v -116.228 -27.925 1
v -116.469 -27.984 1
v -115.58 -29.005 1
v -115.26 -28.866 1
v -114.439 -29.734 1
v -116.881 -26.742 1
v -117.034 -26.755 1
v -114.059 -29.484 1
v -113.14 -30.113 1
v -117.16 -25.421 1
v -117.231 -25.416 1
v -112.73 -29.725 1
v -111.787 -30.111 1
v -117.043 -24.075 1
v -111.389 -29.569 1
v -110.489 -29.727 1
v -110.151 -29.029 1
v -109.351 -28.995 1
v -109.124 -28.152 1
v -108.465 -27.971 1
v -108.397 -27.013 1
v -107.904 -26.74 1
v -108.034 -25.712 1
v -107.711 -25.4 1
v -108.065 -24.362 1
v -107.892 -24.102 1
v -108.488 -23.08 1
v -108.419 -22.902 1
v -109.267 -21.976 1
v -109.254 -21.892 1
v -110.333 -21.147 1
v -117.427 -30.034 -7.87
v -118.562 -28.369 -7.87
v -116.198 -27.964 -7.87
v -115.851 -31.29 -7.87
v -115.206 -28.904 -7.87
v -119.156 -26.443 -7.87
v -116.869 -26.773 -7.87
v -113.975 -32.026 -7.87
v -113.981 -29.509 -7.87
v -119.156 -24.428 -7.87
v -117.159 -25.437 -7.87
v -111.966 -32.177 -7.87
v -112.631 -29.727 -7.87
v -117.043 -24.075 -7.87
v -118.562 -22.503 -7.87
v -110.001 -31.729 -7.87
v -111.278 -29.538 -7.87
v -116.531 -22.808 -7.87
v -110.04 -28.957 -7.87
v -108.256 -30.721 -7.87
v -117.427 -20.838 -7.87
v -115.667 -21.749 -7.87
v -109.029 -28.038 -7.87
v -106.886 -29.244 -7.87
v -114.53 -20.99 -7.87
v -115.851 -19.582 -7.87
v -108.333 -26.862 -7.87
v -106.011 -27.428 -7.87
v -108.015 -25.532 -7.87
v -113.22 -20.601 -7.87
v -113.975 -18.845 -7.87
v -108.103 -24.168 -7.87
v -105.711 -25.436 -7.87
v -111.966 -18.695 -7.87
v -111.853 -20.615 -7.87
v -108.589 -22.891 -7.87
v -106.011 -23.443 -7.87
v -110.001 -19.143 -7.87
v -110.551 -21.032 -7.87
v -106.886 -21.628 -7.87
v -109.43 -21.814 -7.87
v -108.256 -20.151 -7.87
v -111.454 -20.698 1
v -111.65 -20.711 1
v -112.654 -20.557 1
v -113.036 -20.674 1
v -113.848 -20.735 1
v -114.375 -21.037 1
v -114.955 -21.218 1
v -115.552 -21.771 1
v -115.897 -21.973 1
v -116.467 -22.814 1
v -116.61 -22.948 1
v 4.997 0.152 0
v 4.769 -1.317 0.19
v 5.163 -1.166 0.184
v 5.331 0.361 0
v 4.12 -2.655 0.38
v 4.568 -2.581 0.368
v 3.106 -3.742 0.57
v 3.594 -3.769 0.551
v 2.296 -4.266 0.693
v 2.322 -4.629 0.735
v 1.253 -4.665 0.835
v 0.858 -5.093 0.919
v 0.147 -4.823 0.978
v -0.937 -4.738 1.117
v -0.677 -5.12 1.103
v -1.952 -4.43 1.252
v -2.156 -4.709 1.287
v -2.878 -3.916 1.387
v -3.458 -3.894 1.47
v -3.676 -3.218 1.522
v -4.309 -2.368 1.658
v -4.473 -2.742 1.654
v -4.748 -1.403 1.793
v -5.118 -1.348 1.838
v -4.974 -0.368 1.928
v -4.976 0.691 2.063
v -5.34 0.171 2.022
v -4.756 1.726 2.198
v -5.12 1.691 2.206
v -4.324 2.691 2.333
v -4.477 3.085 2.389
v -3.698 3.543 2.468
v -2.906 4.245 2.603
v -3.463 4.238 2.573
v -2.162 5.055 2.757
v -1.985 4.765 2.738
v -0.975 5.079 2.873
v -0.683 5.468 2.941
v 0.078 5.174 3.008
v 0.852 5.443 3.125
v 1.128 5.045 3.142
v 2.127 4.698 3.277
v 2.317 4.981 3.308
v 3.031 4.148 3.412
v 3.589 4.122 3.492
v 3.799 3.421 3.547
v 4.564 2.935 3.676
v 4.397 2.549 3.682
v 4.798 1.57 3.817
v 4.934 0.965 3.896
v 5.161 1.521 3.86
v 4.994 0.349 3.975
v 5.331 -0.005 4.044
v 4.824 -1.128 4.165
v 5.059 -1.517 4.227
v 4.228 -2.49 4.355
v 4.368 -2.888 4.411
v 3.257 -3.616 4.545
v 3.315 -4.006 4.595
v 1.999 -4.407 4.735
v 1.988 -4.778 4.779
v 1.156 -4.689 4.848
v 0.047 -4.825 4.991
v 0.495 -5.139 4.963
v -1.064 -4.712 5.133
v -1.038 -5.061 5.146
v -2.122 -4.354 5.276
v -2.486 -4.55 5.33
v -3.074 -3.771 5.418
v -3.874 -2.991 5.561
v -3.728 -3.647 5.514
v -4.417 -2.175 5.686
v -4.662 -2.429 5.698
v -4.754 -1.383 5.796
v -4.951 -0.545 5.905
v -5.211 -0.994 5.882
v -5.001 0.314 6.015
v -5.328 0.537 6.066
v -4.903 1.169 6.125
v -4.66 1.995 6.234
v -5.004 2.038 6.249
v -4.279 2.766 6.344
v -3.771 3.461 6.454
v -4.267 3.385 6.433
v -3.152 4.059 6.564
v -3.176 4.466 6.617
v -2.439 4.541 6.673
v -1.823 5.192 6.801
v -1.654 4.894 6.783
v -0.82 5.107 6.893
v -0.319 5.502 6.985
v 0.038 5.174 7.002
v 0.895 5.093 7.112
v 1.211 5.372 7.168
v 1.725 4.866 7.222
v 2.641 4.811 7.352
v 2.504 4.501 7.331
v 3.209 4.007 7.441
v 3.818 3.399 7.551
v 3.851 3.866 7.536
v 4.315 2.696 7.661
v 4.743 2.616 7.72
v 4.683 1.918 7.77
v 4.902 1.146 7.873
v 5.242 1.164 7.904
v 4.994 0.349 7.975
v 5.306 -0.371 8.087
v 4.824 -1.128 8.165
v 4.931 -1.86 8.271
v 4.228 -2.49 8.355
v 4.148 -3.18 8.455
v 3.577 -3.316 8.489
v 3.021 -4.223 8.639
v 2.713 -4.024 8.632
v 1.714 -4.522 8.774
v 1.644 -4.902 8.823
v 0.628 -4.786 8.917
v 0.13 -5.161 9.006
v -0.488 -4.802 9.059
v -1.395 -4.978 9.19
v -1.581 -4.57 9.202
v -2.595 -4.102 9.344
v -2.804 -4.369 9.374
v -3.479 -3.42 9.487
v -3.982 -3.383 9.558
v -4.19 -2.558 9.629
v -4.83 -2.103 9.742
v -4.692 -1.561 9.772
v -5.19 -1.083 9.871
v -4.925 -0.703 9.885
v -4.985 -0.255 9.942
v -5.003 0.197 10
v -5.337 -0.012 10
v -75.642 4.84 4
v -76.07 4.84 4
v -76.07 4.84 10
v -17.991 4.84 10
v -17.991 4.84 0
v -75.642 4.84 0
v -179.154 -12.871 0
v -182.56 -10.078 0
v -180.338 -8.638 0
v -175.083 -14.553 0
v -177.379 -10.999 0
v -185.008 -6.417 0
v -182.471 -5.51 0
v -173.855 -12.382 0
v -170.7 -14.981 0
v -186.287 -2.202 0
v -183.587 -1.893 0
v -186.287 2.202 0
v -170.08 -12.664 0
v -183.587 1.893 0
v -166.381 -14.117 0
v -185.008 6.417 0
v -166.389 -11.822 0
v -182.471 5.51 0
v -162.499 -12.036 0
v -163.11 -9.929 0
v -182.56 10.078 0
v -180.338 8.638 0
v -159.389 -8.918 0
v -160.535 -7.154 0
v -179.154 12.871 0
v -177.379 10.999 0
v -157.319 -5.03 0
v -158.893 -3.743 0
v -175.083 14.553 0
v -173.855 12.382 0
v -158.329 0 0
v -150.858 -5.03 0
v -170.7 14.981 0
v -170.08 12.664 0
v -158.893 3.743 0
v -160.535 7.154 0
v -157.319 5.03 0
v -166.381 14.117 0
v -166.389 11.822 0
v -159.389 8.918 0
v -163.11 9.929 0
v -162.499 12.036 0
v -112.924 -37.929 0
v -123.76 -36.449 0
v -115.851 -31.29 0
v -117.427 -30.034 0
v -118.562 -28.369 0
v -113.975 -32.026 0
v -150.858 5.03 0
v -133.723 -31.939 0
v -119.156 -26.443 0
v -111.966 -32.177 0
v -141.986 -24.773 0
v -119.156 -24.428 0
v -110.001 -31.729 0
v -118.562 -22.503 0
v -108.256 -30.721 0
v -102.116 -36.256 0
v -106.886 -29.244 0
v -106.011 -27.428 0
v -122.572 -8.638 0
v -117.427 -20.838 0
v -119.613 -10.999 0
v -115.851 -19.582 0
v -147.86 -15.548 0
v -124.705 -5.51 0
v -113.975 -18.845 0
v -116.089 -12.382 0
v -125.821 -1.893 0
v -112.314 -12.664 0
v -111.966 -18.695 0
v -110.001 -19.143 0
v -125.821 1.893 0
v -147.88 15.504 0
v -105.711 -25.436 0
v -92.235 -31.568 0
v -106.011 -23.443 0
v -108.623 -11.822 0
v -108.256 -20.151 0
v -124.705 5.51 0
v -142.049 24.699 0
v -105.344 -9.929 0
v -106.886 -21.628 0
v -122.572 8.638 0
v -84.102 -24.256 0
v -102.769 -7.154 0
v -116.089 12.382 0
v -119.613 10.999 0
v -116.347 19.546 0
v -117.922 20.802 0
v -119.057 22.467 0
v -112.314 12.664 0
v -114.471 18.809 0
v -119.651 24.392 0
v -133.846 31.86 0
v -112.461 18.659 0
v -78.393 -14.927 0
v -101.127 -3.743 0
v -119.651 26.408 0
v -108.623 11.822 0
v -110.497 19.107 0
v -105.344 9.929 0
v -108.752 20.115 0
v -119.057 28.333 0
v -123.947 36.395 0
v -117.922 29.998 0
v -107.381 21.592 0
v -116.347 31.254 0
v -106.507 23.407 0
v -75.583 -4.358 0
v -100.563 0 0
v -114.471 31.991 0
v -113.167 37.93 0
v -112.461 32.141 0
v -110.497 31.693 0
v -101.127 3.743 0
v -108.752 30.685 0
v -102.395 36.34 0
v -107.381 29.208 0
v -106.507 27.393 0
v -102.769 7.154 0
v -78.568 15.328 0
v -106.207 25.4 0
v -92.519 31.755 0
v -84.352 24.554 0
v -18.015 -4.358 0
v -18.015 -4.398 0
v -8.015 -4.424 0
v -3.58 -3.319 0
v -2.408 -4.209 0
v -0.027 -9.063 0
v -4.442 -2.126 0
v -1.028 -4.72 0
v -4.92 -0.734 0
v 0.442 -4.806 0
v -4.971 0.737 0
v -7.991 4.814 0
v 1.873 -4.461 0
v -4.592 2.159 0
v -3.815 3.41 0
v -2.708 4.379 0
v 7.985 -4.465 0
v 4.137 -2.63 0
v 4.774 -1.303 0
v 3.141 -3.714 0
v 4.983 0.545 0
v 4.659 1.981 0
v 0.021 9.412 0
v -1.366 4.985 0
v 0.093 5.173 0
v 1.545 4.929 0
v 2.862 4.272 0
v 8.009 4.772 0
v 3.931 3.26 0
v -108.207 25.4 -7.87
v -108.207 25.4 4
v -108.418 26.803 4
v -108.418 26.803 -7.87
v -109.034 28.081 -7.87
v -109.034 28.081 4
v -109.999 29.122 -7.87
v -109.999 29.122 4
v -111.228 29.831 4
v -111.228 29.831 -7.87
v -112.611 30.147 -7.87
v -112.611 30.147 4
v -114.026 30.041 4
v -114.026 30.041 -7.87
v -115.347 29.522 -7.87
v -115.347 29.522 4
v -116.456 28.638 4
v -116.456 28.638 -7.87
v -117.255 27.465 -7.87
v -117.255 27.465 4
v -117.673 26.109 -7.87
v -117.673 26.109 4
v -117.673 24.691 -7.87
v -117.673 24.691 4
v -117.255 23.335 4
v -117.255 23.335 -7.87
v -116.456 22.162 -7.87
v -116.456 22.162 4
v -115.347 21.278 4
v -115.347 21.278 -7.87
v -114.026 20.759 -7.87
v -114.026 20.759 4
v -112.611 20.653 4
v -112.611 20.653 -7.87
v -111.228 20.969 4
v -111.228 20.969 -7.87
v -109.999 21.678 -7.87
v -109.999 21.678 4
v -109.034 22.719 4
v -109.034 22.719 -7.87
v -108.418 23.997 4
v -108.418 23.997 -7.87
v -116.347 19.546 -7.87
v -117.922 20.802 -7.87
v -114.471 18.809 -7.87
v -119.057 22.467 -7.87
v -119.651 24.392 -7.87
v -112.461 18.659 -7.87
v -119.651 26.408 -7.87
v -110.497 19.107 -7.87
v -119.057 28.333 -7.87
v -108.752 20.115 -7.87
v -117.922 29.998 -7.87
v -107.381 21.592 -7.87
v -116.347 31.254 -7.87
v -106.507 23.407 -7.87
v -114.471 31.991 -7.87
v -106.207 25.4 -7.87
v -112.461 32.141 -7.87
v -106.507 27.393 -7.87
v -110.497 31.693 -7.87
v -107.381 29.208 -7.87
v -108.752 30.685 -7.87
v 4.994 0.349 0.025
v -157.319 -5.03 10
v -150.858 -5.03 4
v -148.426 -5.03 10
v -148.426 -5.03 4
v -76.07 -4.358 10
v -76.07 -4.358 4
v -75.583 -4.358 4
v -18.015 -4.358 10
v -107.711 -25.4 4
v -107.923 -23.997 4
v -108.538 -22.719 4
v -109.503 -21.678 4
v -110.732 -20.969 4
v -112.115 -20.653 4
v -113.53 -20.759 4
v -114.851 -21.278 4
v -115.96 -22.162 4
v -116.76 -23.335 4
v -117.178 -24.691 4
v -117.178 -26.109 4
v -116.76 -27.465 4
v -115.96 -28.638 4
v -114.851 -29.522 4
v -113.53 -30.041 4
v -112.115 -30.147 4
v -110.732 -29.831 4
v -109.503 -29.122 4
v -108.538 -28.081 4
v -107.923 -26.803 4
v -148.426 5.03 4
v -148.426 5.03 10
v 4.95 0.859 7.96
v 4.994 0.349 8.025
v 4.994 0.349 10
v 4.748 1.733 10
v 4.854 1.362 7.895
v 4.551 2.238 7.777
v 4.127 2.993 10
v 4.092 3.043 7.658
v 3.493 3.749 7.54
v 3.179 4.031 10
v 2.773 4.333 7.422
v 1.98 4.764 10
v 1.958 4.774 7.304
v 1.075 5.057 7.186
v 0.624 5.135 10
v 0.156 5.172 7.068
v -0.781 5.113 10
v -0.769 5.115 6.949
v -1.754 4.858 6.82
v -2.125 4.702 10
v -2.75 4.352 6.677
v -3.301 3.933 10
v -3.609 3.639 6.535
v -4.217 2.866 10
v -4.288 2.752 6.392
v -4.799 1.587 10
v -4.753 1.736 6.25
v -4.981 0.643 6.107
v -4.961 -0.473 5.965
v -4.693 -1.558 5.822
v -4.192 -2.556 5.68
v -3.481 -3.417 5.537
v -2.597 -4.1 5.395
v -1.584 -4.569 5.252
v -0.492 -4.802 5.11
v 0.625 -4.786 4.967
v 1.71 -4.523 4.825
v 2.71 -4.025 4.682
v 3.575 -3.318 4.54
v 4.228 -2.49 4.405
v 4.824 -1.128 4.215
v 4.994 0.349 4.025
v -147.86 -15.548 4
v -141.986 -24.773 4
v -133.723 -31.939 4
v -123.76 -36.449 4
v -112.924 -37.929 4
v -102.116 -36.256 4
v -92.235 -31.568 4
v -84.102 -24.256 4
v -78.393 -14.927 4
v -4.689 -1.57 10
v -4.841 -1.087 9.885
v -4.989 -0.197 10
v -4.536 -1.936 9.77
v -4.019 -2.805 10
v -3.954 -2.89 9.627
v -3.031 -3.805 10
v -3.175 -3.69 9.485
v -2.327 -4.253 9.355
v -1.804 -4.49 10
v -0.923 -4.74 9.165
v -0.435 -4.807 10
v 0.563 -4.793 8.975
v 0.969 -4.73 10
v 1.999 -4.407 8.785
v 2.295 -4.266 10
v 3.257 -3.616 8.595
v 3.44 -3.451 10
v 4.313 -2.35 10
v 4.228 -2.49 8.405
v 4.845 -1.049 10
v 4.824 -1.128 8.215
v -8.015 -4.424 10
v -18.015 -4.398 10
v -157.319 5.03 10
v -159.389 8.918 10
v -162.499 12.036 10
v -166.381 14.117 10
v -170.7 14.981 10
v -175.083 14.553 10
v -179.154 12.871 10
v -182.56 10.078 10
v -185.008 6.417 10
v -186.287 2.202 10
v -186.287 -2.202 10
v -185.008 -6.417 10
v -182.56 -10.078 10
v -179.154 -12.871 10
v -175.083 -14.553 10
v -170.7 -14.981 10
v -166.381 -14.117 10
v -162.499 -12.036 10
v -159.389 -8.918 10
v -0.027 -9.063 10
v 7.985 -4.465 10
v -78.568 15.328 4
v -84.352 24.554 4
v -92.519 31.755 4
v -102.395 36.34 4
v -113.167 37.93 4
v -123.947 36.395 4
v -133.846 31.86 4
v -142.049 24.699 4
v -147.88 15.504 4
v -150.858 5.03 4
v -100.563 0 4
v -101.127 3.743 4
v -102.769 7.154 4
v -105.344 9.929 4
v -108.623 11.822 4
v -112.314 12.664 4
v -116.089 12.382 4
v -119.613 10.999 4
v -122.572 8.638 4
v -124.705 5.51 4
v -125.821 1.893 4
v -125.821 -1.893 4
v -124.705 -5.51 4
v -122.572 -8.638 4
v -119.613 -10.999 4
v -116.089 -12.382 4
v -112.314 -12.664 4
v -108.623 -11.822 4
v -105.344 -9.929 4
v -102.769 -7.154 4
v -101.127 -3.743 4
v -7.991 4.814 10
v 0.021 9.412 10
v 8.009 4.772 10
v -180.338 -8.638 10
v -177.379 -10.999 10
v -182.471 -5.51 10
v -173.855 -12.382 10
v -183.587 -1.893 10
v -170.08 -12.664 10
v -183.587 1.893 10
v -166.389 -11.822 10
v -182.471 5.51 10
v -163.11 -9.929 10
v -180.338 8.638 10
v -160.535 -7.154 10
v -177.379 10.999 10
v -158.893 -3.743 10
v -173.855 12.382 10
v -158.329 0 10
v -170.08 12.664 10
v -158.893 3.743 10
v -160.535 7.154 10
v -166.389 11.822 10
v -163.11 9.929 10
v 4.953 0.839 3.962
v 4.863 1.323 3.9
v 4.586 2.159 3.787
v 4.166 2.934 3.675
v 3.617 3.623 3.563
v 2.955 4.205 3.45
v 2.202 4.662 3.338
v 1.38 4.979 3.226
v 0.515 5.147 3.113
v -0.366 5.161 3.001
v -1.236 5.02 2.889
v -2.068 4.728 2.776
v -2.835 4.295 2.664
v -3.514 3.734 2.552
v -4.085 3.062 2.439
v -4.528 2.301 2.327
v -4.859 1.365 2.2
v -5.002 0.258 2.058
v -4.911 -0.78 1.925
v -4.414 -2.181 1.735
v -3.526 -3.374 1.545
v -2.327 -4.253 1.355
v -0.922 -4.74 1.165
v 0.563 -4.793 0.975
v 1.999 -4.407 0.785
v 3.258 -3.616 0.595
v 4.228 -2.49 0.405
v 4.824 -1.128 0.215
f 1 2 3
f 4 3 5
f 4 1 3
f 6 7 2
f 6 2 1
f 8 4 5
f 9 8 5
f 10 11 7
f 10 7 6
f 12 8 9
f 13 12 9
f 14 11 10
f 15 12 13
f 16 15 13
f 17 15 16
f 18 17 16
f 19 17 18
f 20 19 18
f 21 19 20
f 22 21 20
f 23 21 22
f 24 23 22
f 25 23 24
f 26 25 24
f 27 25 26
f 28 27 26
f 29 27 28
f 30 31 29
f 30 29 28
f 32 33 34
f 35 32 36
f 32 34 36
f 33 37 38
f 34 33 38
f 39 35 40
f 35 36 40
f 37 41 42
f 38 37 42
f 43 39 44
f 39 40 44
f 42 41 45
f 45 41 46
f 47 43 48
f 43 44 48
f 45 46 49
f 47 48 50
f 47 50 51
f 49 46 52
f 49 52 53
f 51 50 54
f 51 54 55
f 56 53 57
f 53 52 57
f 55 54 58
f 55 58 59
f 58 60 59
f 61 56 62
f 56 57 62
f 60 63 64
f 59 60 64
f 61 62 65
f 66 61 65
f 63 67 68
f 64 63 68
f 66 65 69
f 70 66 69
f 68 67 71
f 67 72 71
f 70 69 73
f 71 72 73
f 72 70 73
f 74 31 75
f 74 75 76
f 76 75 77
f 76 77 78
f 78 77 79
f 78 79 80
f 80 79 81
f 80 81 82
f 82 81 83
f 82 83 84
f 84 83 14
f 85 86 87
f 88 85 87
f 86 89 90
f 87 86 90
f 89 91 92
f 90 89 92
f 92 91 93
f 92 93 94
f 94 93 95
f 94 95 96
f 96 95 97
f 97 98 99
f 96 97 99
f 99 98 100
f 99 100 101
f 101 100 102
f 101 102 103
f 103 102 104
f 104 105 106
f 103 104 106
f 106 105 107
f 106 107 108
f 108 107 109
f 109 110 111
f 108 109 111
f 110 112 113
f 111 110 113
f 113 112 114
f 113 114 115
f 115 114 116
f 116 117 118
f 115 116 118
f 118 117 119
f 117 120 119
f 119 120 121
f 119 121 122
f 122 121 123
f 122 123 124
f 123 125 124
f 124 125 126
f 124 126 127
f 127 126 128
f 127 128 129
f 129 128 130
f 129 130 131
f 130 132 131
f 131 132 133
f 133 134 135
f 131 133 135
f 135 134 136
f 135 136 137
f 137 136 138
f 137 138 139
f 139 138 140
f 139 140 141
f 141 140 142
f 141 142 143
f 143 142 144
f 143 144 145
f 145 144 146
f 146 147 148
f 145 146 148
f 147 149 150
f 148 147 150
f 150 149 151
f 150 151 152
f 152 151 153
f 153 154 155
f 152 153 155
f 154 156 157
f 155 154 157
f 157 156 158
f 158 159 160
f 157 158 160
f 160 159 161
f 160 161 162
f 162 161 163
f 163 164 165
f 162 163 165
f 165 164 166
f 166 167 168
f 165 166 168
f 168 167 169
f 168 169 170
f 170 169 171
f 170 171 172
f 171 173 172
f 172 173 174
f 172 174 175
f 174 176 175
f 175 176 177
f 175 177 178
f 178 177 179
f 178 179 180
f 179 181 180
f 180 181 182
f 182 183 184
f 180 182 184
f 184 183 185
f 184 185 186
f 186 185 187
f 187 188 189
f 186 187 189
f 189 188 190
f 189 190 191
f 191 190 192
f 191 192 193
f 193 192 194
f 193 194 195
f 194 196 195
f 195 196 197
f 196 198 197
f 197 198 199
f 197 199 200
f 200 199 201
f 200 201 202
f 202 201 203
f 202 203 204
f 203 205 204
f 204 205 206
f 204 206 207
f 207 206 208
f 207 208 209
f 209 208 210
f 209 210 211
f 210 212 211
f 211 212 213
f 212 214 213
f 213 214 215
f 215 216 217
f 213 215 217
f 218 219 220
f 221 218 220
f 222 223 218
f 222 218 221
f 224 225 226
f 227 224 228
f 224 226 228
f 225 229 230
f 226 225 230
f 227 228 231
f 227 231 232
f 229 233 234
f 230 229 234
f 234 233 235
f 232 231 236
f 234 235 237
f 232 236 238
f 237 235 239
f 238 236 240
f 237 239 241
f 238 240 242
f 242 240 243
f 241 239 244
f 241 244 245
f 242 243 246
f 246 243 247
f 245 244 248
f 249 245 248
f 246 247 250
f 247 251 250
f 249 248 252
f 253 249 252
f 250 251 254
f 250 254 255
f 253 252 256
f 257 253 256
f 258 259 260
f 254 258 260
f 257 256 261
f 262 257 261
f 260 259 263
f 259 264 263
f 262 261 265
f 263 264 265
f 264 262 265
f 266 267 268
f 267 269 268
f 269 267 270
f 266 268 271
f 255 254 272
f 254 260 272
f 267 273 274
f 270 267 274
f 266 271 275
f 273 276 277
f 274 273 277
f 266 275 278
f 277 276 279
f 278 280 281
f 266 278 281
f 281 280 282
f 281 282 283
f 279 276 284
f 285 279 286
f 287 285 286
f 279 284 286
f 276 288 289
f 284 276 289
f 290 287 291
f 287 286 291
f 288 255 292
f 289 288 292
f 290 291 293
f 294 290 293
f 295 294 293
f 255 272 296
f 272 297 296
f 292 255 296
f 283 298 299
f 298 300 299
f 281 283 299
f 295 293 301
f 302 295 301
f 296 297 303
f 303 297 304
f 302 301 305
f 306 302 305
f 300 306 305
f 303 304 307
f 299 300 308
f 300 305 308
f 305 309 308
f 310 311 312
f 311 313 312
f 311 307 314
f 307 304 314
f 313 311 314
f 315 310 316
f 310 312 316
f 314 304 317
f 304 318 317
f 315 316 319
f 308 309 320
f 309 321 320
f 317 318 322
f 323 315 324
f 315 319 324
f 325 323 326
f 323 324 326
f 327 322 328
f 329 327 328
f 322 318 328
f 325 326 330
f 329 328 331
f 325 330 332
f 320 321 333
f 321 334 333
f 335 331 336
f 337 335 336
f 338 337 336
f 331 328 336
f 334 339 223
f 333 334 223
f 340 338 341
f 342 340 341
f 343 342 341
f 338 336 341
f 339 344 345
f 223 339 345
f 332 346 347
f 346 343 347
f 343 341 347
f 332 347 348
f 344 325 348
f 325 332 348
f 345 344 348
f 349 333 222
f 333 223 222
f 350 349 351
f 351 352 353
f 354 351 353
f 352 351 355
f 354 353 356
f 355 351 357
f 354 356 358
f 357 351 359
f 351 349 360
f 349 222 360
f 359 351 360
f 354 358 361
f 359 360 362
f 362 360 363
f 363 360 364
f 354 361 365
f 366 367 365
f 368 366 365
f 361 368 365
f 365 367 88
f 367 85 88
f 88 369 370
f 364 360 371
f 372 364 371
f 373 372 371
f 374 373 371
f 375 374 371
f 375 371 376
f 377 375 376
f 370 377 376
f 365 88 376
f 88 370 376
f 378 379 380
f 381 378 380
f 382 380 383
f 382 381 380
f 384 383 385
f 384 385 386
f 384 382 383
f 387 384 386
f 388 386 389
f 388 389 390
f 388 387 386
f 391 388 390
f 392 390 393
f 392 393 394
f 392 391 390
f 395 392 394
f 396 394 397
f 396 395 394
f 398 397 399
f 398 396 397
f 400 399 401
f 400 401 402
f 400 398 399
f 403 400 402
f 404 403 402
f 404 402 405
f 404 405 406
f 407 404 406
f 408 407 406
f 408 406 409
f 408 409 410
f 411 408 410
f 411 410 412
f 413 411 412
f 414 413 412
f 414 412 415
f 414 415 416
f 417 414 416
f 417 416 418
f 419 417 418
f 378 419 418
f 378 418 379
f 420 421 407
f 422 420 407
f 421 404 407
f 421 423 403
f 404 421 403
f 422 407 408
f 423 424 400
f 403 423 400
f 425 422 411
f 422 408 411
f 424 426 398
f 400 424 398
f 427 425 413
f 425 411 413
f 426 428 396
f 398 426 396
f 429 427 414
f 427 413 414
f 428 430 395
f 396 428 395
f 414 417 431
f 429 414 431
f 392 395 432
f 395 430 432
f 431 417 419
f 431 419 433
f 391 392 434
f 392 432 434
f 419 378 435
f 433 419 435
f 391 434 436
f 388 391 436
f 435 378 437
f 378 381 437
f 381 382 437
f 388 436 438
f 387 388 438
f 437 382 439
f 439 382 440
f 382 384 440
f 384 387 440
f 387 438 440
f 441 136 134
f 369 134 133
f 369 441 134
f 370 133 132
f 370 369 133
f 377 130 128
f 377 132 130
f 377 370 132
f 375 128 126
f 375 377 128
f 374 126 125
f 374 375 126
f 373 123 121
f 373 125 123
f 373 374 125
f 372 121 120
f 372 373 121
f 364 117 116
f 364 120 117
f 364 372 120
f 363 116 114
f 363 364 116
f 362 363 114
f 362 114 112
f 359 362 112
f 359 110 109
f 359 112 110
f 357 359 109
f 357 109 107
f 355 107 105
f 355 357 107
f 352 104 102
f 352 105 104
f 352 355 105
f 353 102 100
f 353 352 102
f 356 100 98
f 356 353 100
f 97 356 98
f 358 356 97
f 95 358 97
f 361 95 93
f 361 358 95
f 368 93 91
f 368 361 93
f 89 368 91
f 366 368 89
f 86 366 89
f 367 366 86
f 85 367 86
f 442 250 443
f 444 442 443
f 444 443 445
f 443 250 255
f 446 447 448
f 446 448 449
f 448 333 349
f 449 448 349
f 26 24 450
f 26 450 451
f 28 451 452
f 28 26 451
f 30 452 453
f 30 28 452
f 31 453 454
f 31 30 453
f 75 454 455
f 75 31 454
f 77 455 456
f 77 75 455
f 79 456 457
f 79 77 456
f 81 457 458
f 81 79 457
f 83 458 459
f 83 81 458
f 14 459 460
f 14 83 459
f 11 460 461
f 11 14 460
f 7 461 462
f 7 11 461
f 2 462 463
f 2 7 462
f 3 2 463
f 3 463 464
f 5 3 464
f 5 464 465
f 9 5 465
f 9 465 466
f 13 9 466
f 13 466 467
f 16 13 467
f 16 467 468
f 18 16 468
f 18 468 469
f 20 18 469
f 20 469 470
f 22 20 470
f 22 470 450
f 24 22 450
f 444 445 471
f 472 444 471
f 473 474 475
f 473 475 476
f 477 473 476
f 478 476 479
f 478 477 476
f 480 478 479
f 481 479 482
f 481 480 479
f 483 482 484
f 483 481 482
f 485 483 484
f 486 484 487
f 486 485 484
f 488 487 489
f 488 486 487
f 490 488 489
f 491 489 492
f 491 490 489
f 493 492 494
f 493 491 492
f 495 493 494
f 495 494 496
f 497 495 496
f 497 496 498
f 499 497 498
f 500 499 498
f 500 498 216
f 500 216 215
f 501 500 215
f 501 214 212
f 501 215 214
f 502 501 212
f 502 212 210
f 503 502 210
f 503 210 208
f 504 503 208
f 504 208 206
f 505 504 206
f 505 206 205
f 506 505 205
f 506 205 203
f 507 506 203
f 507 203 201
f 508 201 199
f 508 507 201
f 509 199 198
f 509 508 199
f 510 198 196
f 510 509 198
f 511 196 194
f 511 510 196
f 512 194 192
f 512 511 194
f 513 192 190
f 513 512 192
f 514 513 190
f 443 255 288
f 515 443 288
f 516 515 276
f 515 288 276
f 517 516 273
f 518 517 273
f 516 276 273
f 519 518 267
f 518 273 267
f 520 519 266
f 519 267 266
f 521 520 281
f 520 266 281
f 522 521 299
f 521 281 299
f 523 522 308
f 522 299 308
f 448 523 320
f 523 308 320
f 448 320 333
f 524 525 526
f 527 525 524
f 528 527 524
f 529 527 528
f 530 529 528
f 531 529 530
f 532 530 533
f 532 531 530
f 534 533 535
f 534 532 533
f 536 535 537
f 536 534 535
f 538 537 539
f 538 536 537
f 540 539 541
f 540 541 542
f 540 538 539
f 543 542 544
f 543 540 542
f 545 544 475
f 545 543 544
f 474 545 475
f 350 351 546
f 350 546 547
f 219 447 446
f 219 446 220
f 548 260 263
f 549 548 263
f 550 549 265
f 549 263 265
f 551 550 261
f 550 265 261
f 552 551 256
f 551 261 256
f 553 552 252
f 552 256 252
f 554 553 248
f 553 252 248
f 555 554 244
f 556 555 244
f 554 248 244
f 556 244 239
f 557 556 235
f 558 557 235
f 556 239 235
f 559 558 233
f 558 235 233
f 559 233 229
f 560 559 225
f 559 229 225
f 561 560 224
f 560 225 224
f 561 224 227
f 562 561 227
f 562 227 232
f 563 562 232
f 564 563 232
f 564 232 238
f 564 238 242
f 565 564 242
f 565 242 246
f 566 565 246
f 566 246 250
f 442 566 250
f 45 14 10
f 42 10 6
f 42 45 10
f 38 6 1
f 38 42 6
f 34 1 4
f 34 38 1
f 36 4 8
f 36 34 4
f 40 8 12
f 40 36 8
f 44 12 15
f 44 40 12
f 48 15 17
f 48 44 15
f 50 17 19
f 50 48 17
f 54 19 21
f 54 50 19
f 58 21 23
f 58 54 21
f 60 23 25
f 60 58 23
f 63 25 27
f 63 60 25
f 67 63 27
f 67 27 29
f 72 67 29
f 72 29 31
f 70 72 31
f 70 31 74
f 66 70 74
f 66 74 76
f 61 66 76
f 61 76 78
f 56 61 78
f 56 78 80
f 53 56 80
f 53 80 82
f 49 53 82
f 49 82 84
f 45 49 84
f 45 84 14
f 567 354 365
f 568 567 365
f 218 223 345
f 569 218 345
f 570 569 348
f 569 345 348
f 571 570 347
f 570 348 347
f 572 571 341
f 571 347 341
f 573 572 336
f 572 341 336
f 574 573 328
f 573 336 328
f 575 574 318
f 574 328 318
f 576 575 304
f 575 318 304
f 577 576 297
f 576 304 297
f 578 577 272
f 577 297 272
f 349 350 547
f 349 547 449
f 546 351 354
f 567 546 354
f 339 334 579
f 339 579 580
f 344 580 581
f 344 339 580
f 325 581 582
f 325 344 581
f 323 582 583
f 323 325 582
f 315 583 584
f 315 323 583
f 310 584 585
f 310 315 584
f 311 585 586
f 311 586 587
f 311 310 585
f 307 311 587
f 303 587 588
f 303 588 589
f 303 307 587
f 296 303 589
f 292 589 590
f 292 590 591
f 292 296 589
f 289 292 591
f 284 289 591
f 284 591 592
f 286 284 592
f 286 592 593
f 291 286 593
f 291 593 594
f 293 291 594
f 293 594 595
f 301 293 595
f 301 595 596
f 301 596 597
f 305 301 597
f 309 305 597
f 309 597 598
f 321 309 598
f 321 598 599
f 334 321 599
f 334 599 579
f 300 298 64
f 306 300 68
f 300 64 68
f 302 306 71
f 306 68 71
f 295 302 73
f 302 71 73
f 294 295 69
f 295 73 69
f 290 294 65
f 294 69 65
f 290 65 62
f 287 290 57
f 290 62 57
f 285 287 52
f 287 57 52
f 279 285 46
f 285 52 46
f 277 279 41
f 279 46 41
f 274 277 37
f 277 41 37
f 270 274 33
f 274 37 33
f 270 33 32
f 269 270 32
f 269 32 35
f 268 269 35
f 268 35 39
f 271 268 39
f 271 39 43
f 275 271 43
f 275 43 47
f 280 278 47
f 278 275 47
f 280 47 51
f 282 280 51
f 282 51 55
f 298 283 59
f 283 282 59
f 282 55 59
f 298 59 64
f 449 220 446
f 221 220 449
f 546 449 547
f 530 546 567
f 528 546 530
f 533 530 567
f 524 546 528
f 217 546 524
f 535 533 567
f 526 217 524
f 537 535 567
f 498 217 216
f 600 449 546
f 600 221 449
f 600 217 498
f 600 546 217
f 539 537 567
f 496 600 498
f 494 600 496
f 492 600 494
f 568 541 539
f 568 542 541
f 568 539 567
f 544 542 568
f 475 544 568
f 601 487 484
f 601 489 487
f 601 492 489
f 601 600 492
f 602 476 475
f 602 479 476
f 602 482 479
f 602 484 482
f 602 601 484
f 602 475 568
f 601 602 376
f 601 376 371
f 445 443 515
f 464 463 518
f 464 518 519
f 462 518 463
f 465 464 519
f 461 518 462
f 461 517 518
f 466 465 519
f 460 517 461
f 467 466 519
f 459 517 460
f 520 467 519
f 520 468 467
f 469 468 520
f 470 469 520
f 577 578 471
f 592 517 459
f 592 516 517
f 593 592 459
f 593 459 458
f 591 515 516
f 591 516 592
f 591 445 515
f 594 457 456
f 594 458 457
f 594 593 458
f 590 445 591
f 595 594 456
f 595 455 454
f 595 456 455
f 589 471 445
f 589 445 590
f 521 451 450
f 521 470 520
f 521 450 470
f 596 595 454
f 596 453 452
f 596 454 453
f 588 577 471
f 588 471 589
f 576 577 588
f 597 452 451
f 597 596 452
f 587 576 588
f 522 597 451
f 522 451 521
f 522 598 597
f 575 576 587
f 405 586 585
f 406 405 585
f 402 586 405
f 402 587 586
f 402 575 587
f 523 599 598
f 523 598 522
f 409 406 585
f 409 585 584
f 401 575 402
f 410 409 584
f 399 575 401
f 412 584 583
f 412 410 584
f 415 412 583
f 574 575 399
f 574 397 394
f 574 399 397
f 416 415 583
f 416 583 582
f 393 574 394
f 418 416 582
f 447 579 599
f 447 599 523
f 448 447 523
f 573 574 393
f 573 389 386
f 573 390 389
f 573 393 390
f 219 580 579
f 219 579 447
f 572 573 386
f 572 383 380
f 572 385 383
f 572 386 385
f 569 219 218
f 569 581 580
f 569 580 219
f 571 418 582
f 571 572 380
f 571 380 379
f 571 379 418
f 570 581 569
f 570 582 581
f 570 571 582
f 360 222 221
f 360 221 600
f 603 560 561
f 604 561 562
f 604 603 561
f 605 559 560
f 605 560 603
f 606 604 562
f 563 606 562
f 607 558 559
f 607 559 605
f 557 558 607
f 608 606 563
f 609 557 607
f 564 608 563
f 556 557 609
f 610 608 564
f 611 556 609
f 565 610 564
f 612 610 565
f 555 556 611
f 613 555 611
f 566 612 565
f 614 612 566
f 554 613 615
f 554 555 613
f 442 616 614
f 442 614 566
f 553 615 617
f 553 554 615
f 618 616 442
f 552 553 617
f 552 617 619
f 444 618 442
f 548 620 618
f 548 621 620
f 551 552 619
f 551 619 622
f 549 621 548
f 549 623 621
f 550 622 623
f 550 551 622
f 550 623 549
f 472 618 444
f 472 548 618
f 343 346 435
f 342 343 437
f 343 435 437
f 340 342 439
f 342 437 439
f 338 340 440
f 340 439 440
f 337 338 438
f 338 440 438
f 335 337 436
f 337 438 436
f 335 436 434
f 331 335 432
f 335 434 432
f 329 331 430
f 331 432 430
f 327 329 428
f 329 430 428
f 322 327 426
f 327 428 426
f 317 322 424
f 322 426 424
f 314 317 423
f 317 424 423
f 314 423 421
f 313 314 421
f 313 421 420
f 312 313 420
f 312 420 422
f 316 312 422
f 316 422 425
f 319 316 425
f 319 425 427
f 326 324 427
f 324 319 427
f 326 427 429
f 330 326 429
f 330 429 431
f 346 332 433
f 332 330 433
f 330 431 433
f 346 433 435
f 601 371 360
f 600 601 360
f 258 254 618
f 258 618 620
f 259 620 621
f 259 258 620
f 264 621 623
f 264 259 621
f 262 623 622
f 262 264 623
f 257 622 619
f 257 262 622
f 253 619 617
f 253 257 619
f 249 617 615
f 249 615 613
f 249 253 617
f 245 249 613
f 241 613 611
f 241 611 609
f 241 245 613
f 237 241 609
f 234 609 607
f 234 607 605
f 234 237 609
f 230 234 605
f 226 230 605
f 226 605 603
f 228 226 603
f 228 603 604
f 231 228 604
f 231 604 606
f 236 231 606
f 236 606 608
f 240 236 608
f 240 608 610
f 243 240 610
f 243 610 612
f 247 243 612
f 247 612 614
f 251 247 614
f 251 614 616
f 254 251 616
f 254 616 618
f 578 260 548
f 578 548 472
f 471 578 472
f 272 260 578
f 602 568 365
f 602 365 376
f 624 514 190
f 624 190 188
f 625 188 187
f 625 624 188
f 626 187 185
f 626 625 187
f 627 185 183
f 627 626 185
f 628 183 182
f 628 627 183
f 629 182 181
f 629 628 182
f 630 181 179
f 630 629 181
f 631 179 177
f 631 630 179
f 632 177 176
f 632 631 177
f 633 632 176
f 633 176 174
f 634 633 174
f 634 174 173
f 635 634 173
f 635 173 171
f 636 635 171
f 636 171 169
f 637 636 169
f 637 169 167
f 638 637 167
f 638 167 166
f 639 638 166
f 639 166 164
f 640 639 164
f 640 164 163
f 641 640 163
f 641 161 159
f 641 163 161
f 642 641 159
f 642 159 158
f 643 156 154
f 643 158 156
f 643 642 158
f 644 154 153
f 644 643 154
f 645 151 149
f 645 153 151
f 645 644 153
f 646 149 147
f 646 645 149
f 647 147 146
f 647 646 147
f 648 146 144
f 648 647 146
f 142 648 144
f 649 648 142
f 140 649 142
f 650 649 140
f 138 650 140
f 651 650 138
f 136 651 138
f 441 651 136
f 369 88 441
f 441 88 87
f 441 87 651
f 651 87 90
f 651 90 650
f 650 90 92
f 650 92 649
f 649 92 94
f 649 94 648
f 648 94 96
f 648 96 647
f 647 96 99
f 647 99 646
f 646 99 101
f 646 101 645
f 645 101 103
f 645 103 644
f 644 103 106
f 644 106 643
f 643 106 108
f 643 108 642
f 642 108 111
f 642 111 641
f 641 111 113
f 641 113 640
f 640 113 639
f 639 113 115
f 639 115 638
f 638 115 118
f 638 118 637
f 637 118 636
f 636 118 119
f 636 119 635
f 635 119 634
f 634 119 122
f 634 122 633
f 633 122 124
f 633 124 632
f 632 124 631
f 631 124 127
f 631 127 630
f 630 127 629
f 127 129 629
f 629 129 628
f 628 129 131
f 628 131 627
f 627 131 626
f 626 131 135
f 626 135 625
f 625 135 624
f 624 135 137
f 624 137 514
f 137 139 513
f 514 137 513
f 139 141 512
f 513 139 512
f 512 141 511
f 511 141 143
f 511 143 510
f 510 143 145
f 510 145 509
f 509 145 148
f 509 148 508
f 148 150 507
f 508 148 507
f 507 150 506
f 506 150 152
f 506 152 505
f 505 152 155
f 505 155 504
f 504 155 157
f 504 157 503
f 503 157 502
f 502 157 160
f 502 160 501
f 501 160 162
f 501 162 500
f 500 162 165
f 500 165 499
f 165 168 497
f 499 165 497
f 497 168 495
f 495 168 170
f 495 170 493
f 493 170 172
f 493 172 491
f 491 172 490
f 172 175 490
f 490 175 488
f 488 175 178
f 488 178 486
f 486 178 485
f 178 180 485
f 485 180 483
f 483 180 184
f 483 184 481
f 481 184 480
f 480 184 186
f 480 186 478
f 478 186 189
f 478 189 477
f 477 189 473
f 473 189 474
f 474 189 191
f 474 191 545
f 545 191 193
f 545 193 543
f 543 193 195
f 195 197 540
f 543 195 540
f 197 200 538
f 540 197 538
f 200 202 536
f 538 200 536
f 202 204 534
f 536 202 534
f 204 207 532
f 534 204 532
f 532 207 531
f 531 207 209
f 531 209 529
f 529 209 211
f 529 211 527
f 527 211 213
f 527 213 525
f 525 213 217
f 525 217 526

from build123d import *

# Parameters (mm, degrees)
BOSS_EXTRUDE1_DEPTH       = 10
CUT_EXTRUDE1_DEPTH        = 10
CUT_EXTRUDE1_DEPTH_BACK   = 10
SKETCH2_R                 = 5
CUT_SWEEP1_PITCH          = 4
CUT_SWEEP1_HEIGHT         = 10
CUT_SWEEP1_RADIUS         = 5
EXTRUDE_THIN2_DEPTH       = 10
BODY_MOVE_COPY1_ANGLE     = 2
SKETCH10_W                = 58.079037791
SKETCH10_H                = 9.197874715
BOSS_EXTRUDE2_DEPTH       = 10
SKETCH21_R                = 37.93035277
BOSS_EXTRUDE11_DEPTH      = 4
CUT_EXTRUDE5_DEPTH        = 4
CUT_EXTRUDE5_DEPTH_BACK   = 4
SKETCH22_R                = 12.7
CUT_EXTRUDE6_DEPTH        = 4
CUT_EXTRUDE6_DEPTH_BACK   = 4
SKETCH23_R                = 4.76
CUT_EXTRUDE7_DEPTH        = 4
CUT_EXTRUDE7_DEPTH_BACK   = 4
SKETCH24_R                = 4.76
BOSS_EXTRUDE13_DEPTH      = 1
BOSS_EXTRUDE13_DEPTH_BACK = 7.87
SKETCH27_R                = 6.76
CUT_EXTRUDE12_DEPTH       = 1
CUT_EXTRUDE12_DEPTH_BACK  = 7.87
SKETCH28_R                = 4.76
BOSS_EXTRUDE14_DEPTH      = 1
BOSS_EXTRUDE14_DEPTH_BACK = 7.87
SKETCH29_R                = 6.76
CUT_EXTRUDE13_DEPTH       = 1
CUT_EXTRUDE13_DEPTH_BACK  = 7.87
SKETCH30_R                = 4.585303289
SKETCH20_W                = 8.892243229
SKETCH20_H                = 10.060161684
BOSS_EXTRUDE15_DEPTH      = 10
SKETCH19_R                = 15
BOSS_EXTRUDE16_DEPTH      = 10
CUT_EXTRUDE14_DEPTH       = 10
CUT_EXTRUDE14_DEPTH_BACK  = 10
SKETCH31_R                = 12.7


with BuildPart() as part:
    # Sketch1 → Boss-Extrude1 (new body)
    with BuildSketch(Plane.XY):
        Polygon((-8.167579482, -4.315550803), (-0.346413115, -9.231106721), (7.821166368, -4.915555918), (8.167579482, 4.315550803), (0.346413115, 9.231106721), (-7.821166368, 4.915555918), align=None)
    extrude(amount=BOSS_EXTRUDE1_DEPTH)

    # Sketch2 → Cut-Extrude1 (cut, two sides: drawn at the far end of the back side and taken through both)
    with BuildSketch(Plane.XY.offset(-CUT_EXTRUDE1_DEPTH_BACK)):
        Circle(SKETCH2_R)
    extrude(amount=CUT_EXTRUDE1_DEPTH + CUT_EXTRUDE1_DEPTH_BACK, mode=Mode.SUBTRACT)

    # Cut-Sweep1: sweep along a helix
    with BuildLine() as cut_sweep1_path:
        Helix(CUT_SWEEP1_PITCH, CUT_SWEEP1_HEIGHT, CUT_SWEEP1_RADIUS, center=(0, 0, 0), direction=(0, 0, 1), lefthand=True)
    # Sketch4 → Cut-Sweep1 (sweep, cut)
    with BuildSketch(Plane.XY):
        Polygon((5.337109255, 0), (4.831445373, 0.291945178), (4.831445373, -0.291945178), align=None)
    sweep(path=cut_sweep1_path.line, is_frenet=True, mode=Mode.SUBTRACT)

    # Sketch6 → Extrude-Thin2 (add)
    with BuildSketch(Plane.XY):
        Polygon((-7.821166368, 4.915555918), (-8.167579482, -4.315550803), (-18.160545639, -3.940547606), (-17.814132524, 5.290559115), align=None)
    extrude(amount=EXTRUDE_THIN2_DEPTH)


with BuildPart() as part_1:
    # Body-Move/Copy1: moved
    add(part.part.rotate(Axis((-4.996483078, 0, 0), (0, 0, 1)), BODY_MOVE_COPY1_ANGLE))

    # Sketch10 → Boss-Extrude2 (add)
    with BuildSketch(Plane.XY):
        with Locations((-47.030481105, 0.241069377)):
            Rectangle(SKETCH10_W, SKETCH10_H)
    extrude(amount=BOSS_EXTRUDE2_DEPTH)

    # Sketch21 → Boss-Extrude11 (add)
    with BuildSketch(Plane.XY):
        with Locations((-113.262670717, 0)):
            Circle(SKETCH21_R)
    extrude(amount=BOSS_EXTRUDE11_DEPTH)

    # Sketch22 → Cut-Extrude5 (cut, two sides: drawn at the far end of the back side and taken through both)
    with BuildSketch(Plane.XY.offset(-CUT_EXTRUDE5_DEPTH_BACK)):
        with Locations((-113.262670717, 0)):
            Circle(SKETCH22_R)
    extrude(amount=CUT_EXTRUDE5_DEPTH + CUT_EXTRUDE5_DEPTH_BACK, mode=Mode.SUBTRACT)

    # Sketch23 → Cut-Extrude6 (cut, two sides: drawn at the far end of the back side and taken through both)
    with BuildSketch(Plane.XY.offset(-CUT_EXTRUDE6_DEPTH_BACK)):
        with Locations((-112.966619713, 25.4)):
            Circle(SKETCH23_R)
    extrude(amount=CUT_EXTRUDE6_DEPTH + CUT_EXTRUDE6_DEPTH_BACK, mode=Mode.SUBTRACT)

    # Sketch24 → Cut-Extrude7 (cut, two sides: drawn at the far end of the back side and taken through both)
    with BuildSketch(Plane.XY.offset(-CUT_EXTRUDE7_DEPTH_BACK)):
        with Locations((-112.471115727, -25.4)):
            Circle(SKETCH24_R)
    extrude(amount=CUT_EXTRUDE7_DEPTH + CUT_EXTRUDE7_DEPTH_BACK, mode=Mode.SUBTRACT)

    # Sketch27 → Boss-Extrude13 (add, two sides: drawn at the far end of the back side and taken through both)
    with BuildSketch(Plane.XY.offset(-BOSS_EXTRUDE13_DEPTH_BACK)):
        with Locations((-112.966619713, 25.4)):
            Circle(SKETCH27_R)
    extrude(amount=BOSS_EXTRUDE13_DEPTH + BOSS_EXTRUDE13_DEPTH_BACK)

    # Sketch28 → Cut-Extrude12 (cut, two sides: drawn at the far end of the back side and taken through both)
    with BuildSketch(Plane.XY.offset(-CUT_EXTRUDE12_DEPTH_BACK)):
        with Locations((-112.966619713, 25.4)):
            Circle(SKETCH28_R)
    extrude(amount=CUT_EXTRUDE12_DEPTH + CUT_EXTRUDE12_DEPTH_BACK, mode=Mode.SUBTRACT)

    # Sketch29 → Boss-Extrude14 (add, two sides: drawn at the far end of the back side and taken through both)
    with BuildSketch(Plane(origin=(-24.725624919, 0.221889436, 0), x_dir=(1, 0, 0), z_dir=(0, 0, 1)).offset(-BOSS_EXTRUDE14_DEPTH_BACK)):
        with Locations((-87.745490808, -25.657760722)):
            Circle(SKETCH29_R)
    extrude(amount=BOSS_EXTRUDE14_DEPTH + BOSS_EXTRUDE14_DEPTH_BACK)

    # Sketch30 → Cut-Extrude13 (cut, two sides: drawn at the far end of the back side and taken through both)
    with BuildSketch(Plane.XY.offset(-CUT_EXTRUDE13_DEPTH_BACK)):
        with Locations(Location((-112.583618689, -25.142193243, 0), (0, 0, 166.546290498))):
            Circle(SKETCH30_R)
    extrude(amount=CUT_EXTRUDE13_DEPTH + CUT_EXTRUDE13_DEPTH_BACK, mode=Mode.SUBTRACT)

    # Sketch20 → Boss-Extrude15 (add)
    with BuildSketch(Plane.XY):
        with Locations((-152.872413964, 0)):
            Rectangle(SKETCH20_W, SKETCH20_H)
    extrude(amount=BOSS_EXTRUDE15_DEPTH)

    # Sketch19 → Boss-Extrude16 (add)
    with BuildSketch(Plane.XY):
        with Locations((-171.45, 0)):
            Circle(SKETCH19_R)
    extrude(amount=BOSS_EXTRUDE16_DEPTH)

    # Sketch31 → Cut-Extrude14 (cut, two sides: drawn at the far end of the back side and taken through both)
    with BuildSketch(Plane.XY.offset(-CUT_EXTRUDE14_DEPTH_BACK)):
        with Locations((-171.028613762, 0)):
            Circle(SKETCH31_R)
    extrude(amount=CUT_EXTRUDE14_DEPTH + CUT_EXTRUDE14_DEPTH_BACK, mode=Mode.SUBTRACT)


solid = part_1.part
